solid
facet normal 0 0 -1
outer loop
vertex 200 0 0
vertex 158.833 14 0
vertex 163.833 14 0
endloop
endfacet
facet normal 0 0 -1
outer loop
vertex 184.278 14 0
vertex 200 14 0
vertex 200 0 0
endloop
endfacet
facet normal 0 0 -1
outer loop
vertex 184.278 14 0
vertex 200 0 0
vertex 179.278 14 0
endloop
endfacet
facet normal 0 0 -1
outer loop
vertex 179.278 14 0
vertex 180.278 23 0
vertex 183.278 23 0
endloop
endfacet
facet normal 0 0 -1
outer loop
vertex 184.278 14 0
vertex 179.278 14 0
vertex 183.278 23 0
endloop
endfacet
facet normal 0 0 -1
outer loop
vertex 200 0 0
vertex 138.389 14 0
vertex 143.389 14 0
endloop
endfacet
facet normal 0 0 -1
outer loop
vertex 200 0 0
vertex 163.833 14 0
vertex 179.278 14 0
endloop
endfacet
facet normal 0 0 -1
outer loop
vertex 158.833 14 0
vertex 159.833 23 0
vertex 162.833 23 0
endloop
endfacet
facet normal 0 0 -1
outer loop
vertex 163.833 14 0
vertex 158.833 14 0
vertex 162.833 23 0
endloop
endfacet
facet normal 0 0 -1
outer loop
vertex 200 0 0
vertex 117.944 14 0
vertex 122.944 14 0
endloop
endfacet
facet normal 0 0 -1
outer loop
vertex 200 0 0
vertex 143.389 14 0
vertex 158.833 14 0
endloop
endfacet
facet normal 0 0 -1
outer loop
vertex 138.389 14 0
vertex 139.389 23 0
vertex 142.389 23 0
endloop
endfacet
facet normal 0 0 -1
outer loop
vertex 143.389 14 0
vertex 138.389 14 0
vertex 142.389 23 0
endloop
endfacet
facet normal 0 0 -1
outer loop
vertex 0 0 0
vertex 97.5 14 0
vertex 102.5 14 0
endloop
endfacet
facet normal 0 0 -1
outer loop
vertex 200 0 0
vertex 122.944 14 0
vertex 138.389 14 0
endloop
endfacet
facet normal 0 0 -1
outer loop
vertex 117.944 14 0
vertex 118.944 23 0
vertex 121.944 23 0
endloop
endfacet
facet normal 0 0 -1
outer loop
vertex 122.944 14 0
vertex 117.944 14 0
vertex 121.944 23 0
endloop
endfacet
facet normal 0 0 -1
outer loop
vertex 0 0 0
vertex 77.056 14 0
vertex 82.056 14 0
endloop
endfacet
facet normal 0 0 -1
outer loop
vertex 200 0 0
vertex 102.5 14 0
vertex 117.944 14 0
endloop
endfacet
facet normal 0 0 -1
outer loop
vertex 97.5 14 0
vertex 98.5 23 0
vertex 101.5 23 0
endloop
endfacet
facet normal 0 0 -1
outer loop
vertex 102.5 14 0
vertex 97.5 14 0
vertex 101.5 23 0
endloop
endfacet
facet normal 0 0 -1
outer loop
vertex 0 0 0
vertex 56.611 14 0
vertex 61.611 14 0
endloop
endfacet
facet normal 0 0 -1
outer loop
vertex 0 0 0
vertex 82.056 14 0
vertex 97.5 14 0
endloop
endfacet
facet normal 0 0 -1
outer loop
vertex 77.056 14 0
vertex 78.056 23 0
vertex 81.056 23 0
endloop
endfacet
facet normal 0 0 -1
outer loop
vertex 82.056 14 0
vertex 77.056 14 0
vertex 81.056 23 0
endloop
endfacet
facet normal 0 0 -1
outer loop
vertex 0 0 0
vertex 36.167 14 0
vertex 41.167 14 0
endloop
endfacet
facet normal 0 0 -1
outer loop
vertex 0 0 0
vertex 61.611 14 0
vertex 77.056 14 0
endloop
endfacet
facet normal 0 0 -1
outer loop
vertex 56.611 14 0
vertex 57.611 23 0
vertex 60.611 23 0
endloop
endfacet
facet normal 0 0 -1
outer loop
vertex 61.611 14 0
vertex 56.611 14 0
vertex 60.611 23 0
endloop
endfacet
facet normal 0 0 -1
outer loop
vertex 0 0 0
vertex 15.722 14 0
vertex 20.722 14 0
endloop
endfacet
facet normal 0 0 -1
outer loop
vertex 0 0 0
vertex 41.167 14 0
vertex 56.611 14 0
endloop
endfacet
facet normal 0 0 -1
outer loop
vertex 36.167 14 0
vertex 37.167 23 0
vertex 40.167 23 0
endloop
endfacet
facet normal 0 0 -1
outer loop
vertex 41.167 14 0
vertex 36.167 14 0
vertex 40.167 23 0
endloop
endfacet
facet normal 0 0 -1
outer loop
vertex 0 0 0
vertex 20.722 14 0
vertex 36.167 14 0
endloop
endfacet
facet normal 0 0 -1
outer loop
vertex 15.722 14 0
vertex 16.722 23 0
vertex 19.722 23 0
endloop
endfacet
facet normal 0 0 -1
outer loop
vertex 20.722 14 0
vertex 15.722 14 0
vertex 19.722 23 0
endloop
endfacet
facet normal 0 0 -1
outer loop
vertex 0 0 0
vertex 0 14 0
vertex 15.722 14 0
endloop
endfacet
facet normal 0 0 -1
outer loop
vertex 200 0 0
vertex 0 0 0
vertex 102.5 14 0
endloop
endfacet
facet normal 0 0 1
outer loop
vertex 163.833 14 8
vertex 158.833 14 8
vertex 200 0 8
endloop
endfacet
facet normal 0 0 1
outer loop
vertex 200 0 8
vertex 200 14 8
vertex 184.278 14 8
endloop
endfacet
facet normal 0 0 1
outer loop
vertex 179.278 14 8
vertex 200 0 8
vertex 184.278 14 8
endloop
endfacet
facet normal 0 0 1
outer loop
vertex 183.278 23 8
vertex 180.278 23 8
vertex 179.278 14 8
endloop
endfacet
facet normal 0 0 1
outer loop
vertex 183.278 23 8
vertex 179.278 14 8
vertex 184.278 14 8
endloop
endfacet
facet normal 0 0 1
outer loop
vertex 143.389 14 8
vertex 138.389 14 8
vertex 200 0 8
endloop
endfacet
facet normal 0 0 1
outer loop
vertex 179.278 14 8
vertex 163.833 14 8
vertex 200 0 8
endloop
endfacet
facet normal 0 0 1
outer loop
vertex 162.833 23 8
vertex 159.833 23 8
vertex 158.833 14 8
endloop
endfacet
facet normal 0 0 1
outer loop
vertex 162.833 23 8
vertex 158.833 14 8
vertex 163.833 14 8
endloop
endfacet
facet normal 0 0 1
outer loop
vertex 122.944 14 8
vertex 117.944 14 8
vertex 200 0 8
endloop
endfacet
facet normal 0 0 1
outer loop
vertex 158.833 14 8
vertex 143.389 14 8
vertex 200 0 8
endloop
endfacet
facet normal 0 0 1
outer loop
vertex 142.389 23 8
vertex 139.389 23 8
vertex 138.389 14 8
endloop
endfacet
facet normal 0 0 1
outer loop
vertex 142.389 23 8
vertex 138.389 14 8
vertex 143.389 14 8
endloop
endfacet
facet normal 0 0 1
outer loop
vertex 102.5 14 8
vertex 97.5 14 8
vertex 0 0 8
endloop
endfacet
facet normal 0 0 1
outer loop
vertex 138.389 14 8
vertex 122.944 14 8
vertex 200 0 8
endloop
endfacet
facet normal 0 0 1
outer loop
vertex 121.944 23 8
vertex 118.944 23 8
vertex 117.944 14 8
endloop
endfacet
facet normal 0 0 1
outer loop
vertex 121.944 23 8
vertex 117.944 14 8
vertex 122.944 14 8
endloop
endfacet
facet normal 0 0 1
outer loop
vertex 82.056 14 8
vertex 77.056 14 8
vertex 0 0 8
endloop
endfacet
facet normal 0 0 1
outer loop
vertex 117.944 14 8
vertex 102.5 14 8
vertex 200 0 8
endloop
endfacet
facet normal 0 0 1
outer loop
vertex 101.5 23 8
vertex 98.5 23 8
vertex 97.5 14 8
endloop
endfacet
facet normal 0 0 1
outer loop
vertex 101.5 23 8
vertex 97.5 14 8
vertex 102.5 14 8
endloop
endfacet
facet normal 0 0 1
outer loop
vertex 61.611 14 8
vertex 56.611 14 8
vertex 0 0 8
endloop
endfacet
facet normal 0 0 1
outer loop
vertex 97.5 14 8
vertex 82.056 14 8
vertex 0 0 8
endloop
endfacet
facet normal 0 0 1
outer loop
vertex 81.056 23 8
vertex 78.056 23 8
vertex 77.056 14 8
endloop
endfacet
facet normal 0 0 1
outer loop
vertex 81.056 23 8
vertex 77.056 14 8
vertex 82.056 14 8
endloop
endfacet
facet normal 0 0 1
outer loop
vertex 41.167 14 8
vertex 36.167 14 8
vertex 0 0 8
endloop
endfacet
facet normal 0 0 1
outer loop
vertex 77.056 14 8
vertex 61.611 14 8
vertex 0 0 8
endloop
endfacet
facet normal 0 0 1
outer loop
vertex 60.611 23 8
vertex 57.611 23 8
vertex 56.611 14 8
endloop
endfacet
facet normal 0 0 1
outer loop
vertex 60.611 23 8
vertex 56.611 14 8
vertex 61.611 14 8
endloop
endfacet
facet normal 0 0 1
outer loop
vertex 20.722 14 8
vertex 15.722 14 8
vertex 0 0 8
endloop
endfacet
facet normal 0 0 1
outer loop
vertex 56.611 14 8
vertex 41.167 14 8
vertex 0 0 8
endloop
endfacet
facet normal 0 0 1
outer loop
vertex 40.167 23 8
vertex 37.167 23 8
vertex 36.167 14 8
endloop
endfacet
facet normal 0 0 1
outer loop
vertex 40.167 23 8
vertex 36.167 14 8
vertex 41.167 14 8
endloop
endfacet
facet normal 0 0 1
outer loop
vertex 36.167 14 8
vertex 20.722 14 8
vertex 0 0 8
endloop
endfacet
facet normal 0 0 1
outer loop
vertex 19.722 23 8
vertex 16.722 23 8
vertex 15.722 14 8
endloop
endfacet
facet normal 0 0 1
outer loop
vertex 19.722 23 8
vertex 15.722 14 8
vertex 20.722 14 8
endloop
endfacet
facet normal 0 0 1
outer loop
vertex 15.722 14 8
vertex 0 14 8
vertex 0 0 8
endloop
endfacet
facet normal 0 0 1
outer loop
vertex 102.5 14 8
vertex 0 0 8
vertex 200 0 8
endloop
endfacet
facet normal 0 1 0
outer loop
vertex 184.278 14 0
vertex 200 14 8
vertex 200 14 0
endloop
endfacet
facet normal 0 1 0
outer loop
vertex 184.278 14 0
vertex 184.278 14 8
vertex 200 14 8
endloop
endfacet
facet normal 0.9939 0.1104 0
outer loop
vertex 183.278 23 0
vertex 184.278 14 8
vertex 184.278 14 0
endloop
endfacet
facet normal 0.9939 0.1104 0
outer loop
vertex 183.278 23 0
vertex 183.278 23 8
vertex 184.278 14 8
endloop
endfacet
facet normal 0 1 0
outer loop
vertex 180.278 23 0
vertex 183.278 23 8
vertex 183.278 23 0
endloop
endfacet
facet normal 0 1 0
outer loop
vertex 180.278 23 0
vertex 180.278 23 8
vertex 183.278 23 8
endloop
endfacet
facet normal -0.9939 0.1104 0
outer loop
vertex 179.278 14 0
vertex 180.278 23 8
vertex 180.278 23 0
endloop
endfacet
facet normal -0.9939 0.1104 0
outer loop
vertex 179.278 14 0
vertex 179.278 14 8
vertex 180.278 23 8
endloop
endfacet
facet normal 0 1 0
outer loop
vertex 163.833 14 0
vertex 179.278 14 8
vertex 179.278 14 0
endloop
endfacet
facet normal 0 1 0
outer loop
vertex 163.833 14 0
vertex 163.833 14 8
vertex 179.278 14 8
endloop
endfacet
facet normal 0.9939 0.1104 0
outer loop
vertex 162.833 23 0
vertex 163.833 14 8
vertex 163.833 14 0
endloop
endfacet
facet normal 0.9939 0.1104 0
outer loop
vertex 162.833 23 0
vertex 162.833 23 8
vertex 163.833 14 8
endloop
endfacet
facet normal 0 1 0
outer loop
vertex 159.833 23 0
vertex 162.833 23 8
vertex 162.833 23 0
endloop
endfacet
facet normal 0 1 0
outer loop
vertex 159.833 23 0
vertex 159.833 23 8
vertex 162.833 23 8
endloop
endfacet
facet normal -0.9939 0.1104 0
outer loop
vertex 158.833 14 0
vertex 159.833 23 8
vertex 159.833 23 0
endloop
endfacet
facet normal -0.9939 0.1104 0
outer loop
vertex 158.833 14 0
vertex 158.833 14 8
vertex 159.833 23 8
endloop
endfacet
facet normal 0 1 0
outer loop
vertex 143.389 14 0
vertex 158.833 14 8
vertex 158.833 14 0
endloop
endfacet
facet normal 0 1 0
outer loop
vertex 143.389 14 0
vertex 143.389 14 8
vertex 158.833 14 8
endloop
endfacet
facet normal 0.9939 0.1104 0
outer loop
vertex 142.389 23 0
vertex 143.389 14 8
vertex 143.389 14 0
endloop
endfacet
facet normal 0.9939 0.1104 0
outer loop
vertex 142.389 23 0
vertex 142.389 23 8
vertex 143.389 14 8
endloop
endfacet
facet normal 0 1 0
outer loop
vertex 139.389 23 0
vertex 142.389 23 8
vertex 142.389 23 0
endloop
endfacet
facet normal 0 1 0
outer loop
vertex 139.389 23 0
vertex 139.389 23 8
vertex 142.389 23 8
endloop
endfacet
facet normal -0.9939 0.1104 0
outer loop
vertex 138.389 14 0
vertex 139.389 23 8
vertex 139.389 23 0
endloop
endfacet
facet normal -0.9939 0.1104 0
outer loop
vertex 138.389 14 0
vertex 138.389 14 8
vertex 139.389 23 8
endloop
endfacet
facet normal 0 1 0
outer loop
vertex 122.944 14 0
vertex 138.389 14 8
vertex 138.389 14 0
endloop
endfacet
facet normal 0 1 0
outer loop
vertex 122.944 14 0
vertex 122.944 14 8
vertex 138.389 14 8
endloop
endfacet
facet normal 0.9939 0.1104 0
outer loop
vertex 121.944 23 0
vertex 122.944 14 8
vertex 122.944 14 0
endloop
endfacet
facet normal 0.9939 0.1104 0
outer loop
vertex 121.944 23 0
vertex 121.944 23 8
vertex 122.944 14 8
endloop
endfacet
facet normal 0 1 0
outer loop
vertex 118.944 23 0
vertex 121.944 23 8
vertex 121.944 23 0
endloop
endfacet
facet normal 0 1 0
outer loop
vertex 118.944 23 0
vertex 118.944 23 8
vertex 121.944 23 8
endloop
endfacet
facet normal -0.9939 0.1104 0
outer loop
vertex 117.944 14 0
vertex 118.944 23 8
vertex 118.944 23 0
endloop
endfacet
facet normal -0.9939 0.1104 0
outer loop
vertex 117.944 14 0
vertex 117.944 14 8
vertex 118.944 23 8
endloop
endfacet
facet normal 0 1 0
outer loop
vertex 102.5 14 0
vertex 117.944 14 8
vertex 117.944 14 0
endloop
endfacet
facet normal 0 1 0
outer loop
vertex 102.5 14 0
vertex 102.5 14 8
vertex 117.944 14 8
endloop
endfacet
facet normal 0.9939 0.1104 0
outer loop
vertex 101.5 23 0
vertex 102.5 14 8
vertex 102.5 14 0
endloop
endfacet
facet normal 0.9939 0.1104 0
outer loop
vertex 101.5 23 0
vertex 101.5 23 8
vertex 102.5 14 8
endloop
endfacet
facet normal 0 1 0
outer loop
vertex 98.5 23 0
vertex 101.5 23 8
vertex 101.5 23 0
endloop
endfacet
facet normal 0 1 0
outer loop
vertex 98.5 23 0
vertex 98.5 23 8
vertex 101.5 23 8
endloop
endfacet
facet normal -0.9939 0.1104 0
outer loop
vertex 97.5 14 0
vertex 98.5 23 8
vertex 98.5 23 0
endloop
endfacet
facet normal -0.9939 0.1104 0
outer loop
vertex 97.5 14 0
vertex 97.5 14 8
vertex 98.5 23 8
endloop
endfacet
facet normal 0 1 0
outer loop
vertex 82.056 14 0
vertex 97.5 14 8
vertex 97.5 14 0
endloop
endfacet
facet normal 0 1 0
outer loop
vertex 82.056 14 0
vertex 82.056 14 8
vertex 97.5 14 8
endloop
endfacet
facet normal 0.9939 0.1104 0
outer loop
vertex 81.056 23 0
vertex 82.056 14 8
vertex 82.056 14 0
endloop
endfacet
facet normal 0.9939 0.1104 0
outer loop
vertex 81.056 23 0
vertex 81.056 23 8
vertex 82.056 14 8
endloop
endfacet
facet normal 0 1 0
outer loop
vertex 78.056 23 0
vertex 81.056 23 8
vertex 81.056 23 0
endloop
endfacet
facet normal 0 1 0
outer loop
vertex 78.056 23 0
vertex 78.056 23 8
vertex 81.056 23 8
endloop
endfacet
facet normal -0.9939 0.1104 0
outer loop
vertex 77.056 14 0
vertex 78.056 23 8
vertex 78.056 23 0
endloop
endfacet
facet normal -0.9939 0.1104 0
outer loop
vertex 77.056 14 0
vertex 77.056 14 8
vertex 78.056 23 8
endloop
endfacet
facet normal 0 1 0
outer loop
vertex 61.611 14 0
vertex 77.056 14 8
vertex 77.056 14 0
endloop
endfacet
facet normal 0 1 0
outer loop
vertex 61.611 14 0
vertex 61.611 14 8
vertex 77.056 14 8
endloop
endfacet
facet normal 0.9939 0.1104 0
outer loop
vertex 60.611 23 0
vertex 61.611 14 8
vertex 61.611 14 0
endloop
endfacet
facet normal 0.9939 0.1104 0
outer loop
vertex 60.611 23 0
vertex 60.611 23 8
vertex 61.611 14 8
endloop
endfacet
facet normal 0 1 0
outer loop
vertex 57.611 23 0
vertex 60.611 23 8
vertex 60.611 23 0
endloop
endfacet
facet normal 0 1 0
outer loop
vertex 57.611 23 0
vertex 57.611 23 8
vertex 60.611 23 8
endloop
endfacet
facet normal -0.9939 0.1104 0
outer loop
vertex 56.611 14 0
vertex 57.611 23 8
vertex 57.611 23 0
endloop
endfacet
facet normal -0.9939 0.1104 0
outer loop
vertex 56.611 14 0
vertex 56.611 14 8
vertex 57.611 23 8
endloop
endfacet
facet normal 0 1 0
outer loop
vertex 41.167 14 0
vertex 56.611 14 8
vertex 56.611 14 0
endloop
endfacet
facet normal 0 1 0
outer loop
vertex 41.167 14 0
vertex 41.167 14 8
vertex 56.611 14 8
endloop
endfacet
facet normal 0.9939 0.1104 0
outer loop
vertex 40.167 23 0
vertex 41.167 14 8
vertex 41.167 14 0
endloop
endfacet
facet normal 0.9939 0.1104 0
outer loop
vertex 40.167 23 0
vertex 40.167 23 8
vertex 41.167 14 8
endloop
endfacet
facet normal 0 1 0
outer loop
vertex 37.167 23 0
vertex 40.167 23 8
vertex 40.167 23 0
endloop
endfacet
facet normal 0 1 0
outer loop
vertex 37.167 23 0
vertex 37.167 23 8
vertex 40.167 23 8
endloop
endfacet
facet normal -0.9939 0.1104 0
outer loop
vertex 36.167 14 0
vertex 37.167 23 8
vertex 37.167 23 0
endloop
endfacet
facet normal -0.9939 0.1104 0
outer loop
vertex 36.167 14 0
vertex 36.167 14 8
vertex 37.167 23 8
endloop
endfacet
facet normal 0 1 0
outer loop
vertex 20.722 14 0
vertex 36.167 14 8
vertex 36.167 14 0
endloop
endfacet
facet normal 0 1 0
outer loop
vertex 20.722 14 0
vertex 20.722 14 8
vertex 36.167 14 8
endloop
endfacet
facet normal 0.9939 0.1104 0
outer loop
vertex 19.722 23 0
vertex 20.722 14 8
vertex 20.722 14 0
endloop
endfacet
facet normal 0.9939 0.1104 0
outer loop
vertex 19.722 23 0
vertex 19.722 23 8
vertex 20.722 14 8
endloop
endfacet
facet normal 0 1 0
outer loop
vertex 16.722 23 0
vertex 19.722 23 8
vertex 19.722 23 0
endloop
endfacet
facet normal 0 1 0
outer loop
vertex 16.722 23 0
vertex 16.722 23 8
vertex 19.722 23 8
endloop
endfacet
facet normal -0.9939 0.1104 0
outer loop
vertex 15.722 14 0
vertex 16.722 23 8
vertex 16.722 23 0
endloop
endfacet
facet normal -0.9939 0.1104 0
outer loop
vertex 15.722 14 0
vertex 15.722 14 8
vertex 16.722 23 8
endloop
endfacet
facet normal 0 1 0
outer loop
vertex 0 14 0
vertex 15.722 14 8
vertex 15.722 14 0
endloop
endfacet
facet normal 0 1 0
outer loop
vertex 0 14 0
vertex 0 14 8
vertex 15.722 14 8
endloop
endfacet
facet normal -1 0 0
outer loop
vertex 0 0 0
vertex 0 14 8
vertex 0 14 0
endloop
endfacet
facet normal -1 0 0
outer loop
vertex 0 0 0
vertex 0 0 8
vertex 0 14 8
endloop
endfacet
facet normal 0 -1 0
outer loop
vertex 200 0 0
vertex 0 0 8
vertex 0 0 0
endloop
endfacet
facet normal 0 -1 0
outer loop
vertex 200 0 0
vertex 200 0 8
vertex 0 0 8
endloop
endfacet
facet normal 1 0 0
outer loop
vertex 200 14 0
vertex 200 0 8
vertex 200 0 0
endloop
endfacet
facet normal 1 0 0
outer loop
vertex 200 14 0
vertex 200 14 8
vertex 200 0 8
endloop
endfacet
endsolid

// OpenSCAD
$fn = 32;

// ----------------------------------------------------------------------
// Gear rack: 9 teeth on a 200 mm bar, pitch 20.44 mm
// ----------------------------------------------------------------------

// --- parameters (mm) ---
profile_height = 8;       // extrusion height
profile_points = 40;      // points of the closed outline

profile = [[0, 0], [200, 0], [200, 14], [184.278, 14], [183.278, 23], [180.278, 23], [179.278, 14], [163.833, 14], [162.833, 23], [159.833, 23], [158.833, 14], [143.389, 14], [142.389, 23], [139.389, 23], [138.389, 14], [122.944, 14], [121.944, 23], [118.944, 23], [117.944, 14], [102.5, 14], [101.5, 23], [98.5, 23], [97.5, 14], [82.056, 14], [81.056, 23], [78.056, 23], [77.056, 14], [61.611, 14], [60.611, 23], [57.611, 23], [56.611, 14], [41.167, 14], [40.167, 23], [37.167, 23], [36.167, 14], [20.722, 14], [19.722, 23], [16.722, 23], [15.722, 14], [0, 14]];  // single closed polygon, 40 points, counter clockwise

// --- the one profile operation ---
linear_extrude(height = profile_height) polygon(points = profile);
